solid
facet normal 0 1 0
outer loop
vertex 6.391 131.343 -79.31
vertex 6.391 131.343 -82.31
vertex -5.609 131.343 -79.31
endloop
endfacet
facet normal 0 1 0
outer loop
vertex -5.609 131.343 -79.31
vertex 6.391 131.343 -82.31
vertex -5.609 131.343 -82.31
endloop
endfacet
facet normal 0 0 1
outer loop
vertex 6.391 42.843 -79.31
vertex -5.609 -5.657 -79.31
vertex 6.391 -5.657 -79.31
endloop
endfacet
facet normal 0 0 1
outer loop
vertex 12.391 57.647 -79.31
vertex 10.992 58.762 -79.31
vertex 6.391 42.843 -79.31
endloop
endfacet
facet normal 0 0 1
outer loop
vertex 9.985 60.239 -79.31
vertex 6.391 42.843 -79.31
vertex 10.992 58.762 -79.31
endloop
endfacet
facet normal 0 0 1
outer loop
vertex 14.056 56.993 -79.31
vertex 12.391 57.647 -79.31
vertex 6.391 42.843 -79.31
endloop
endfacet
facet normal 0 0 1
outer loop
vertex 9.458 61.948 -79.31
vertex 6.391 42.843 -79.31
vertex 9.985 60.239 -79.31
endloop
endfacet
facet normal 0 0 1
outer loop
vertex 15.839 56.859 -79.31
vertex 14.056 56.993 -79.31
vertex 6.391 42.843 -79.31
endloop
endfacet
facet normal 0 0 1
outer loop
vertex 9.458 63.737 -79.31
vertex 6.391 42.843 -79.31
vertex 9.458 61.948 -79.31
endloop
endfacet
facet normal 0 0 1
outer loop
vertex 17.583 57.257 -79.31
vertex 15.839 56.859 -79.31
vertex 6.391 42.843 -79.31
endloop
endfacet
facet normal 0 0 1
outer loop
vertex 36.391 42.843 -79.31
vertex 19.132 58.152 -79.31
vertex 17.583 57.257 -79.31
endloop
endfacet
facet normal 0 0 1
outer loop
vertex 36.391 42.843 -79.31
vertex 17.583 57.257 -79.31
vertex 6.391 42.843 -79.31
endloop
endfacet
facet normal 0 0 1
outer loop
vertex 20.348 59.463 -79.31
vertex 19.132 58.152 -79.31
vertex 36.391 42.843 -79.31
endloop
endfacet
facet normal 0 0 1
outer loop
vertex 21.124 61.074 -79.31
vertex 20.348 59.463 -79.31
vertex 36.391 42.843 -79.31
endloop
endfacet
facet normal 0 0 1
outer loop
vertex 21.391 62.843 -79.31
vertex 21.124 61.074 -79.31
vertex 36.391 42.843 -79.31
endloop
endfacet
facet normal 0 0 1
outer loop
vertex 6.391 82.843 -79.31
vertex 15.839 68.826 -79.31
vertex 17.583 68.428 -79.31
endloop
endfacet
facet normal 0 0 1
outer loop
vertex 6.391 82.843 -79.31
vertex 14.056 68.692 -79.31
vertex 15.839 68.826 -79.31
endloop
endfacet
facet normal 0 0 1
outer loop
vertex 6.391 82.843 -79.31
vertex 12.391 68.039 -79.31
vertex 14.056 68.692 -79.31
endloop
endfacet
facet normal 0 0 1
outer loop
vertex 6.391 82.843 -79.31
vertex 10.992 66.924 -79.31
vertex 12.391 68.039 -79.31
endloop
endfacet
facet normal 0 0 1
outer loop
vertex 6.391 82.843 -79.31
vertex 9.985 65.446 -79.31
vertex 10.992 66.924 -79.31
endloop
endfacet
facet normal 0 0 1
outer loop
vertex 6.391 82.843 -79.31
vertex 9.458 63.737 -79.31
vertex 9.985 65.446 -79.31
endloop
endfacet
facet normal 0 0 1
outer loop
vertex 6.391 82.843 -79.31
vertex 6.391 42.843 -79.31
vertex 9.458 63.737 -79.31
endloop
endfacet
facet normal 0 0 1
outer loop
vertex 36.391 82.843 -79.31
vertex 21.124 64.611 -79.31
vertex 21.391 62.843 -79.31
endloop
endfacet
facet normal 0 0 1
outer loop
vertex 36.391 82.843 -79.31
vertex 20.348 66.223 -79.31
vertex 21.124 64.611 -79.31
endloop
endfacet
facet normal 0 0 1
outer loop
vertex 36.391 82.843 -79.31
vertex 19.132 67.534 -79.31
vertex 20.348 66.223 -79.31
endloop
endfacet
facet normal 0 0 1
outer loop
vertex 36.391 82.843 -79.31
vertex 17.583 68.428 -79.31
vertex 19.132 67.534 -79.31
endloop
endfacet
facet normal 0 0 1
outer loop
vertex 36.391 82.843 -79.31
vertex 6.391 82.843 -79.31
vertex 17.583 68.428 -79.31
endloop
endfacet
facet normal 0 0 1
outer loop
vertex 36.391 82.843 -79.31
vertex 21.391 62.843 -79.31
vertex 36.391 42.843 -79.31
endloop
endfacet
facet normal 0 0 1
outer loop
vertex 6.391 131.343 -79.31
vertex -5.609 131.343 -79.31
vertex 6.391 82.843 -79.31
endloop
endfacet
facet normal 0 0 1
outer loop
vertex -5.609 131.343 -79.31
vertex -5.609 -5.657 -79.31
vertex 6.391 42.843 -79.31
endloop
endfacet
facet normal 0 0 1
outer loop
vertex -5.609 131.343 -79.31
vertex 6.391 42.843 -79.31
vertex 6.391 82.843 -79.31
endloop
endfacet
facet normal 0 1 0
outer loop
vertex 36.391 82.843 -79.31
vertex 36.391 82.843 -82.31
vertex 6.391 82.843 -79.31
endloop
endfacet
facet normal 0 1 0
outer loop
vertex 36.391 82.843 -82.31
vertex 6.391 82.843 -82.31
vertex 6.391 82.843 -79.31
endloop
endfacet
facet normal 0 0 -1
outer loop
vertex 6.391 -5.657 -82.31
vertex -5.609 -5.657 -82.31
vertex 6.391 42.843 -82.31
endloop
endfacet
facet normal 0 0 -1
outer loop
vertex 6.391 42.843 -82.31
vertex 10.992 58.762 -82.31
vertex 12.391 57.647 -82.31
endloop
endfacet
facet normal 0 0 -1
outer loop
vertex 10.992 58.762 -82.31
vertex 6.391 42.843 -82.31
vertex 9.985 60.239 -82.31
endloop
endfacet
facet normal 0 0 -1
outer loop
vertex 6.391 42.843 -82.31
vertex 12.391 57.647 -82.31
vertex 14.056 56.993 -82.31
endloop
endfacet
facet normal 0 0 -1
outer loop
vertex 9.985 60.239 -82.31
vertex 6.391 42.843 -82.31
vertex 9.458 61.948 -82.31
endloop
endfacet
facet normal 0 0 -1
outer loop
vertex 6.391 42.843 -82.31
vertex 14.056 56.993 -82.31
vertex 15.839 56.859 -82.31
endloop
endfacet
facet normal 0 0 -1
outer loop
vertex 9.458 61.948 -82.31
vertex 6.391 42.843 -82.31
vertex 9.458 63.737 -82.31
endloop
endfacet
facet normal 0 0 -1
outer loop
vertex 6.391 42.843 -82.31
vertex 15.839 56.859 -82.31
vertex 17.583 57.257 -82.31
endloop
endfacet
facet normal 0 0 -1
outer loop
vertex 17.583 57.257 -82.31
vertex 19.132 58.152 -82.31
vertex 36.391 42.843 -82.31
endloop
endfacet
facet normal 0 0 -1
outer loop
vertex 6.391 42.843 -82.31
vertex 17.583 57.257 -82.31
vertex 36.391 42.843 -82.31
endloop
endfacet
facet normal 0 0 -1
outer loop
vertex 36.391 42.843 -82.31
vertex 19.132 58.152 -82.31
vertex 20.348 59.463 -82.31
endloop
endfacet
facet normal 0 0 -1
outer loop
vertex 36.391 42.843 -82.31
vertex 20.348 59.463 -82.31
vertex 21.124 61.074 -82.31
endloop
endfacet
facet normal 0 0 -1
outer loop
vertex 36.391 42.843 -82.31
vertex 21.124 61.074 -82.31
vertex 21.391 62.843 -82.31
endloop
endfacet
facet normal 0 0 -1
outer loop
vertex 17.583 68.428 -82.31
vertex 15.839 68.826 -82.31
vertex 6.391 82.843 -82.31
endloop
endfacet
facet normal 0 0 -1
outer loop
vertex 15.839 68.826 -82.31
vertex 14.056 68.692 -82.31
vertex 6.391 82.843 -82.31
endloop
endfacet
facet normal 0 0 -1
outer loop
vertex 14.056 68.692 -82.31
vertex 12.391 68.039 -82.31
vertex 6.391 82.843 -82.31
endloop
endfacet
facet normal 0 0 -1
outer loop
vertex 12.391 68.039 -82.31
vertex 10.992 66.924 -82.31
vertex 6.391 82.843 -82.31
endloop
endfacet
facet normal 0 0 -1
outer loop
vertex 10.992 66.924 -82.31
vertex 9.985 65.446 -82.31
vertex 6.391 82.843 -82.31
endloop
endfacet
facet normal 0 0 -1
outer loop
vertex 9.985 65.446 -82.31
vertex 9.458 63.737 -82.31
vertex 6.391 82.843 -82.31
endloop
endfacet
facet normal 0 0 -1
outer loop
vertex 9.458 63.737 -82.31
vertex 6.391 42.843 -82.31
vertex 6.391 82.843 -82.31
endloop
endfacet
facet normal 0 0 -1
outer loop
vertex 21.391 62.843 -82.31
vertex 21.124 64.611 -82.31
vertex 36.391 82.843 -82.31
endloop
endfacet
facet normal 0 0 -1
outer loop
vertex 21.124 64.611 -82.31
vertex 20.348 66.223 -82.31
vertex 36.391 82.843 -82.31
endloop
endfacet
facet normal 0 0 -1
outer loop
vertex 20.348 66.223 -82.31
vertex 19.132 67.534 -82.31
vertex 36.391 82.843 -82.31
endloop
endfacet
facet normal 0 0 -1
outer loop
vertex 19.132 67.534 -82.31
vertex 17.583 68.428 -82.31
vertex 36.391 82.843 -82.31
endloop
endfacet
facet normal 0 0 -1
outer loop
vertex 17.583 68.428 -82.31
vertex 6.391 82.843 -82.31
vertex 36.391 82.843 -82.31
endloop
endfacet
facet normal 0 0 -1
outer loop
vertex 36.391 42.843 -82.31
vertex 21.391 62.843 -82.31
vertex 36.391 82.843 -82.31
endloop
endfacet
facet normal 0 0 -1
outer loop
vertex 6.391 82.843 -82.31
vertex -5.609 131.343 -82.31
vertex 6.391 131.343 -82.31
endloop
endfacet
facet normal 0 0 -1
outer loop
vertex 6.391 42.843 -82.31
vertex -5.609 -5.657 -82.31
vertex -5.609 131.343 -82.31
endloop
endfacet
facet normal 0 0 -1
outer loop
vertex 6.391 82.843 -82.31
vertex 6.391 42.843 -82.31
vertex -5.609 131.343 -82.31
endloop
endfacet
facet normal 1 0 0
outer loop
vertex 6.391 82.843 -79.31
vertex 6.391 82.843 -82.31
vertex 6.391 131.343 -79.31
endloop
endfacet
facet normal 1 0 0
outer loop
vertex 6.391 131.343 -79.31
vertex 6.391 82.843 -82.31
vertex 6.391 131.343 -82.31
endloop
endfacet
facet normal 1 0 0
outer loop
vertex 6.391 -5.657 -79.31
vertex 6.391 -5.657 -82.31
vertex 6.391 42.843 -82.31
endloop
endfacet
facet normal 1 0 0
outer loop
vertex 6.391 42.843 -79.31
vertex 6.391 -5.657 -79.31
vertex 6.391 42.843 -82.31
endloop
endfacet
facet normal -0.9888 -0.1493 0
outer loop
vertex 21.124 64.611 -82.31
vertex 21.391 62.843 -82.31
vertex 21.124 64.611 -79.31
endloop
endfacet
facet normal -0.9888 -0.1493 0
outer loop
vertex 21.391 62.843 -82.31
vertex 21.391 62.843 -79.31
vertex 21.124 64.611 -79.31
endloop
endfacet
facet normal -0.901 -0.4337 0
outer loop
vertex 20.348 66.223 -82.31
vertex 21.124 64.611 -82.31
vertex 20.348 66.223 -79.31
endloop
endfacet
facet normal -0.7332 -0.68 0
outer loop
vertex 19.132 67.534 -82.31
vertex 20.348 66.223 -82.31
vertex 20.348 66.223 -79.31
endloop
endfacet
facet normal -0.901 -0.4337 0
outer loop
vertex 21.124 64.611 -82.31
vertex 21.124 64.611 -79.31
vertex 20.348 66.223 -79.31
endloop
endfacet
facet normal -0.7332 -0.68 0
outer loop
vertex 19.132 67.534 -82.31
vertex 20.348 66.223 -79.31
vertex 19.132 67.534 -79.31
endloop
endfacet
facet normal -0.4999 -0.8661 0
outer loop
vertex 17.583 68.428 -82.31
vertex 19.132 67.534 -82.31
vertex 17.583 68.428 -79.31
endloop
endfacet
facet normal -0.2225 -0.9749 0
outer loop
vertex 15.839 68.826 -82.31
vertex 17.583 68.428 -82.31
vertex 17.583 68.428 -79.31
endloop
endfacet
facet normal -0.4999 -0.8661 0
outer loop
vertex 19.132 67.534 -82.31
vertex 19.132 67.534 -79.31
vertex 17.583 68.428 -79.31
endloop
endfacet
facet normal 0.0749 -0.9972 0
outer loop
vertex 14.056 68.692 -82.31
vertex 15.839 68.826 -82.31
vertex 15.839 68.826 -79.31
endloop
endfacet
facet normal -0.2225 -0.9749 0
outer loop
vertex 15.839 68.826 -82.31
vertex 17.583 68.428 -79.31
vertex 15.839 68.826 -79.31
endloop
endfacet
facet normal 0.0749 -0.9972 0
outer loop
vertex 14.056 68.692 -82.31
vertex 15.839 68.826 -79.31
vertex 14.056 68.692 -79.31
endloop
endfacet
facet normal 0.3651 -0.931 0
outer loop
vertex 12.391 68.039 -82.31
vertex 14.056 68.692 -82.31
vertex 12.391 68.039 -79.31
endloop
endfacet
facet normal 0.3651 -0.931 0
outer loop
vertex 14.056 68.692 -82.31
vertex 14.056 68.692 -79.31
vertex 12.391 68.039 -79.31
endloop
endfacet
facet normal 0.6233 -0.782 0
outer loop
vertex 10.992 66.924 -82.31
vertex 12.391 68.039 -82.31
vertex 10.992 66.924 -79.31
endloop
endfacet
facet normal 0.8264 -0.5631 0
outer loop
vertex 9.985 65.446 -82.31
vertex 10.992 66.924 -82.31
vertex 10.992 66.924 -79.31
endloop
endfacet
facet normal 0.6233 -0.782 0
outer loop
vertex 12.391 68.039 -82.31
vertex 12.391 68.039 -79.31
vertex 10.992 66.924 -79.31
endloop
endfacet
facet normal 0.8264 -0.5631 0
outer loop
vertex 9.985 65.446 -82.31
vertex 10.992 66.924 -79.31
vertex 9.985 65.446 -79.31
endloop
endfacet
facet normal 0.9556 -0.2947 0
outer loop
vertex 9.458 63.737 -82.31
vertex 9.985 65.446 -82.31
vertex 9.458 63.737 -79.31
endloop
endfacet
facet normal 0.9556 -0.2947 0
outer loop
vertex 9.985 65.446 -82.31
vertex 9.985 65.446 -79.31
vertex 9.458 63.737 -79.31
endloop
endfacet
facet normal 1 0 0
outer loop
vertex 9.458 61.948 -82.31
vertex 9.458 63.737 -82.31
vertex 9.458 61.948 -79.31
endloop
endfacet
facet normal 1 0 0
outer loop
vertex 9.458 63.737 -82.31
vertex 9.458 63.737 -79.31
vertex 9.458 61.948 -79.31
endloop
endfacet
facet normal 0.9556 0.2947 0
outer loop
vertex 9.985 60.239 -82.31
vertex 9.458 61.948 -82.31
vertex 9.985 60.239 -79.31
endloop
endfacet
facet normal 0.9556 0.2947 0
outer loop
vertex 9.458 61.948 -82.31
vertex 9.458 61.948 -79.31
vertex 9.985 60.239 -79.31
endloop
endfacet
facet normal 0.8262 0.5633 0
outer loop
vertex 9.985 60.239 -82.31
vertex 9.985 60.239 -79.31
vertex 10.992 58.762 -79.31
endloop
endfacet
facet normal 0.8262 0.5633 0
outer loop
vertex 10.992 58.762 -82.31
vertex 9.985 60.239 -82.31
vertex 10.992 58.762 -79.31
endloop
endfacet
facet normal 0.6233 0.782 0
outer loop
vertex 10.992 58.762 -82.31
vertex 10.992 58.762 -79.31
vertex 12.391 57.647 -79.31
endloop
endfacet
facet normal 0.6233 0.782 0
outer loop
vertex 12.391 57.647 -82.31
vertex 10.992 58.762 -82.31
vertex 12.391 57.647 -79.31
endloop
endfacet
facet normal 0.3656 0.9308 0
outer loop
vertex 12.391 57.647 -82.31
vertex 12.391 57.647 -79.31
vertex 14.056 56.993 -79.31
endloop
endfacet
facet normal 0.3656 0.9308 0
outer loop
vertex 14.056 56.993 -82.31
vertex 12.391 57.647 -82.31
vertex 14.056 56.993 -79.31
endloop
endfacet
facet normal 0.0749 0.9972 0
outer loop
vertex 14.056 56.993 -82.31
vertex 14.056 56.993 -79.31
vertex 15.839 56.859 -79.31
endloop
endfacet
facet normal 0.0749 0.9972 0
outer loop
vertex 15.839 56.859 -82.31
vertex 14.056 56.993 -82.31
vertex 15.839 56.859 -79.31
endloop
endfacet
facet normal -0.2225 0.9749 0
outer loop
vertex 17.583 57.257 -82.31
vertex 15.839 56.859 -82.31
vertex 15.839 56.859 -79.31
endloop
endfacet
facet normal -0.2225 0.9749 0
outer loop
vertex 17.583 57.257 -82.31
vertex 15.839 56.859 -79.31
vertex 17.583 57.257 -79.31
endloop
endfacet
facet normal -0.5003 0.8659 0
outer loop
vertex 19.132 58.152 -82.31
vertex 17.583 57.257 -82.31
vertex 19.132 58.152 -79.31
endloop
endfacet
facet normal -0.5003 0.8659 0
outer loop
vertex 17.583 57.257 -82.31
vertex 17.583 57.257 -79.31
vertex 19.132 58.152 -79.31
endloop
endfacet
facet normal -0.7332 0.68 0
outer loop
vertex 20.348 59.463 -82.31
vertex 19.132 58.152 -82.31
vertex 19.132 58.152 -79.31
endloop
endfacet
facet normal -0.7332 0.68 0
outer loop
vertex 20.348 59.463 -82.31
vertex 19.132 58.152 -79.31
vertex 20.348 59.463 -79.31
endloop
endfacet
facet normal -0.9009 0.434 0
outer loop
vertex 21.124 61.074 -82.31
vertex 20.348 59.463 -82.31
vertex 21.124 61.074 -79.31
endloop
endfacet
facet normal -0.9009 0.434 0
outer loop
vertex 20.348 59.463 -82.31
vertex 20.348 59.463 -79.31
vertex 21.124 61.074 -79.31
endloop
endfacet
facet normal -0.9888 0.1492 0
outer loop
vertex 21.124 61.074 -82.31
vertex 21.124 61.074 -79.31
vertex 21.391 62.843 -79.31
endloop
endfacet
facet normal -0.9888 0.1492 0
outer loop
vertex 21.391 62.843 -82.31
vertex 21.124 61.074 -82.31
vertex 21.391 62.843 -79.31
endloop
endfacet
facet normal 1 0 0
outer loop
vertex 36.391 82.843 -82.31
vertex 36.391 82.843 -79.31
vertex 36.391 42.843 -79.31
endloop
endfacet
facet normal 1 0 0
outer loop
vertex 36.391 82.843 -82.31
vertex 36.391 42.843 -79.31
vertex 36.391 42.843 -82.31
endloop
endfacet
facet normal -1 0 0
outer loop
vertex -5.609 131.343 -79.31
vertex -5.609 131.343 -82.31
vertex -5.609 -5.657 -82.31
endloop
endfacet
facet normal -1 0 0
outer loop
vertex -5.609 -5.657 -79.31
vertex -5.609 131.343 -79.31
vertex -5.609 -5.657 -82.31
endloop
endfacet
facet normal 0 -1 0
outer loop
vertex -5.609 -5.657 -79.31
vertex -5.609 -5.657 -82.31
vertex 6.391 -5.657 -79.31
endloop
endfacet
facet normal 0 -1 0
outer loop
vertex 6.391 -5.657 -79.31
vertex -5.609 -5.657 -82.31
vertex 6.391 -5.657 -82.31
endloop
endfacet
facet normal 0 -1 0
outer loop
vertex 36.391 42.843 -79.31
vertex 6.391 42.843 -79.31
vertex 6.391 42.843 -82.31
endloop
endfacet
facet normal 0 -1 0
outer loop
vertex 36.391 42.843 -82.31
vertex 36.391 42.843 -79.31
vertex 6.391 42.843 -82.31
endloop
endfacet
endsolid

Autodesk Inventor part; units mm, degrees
ref_plane "YZ Plane" through (0, 0, 0) normal (1, 0, 0) x (0, 1, 0)
ref_plane "XZ Plane" through (0, 0, 0) normal (0, 1, 0) x (-1, 0, 0)
ref_plane "XY Plane" through (0, 0, 0) normal (0, 0, 1) x (1, 0, 0)
sketch "Sketch1" plane through (0, 0, 0) normal (0, 0, 1) x (1, 0, 0)
  point P0 (0, 0)
ref_plane "Work Plane1" through (0, 125.1054, -82.3097) normal (0, 0, 1) x (1, 0, 0)
sketch "Sketch2" plane through (0, 125.1054, -82.3097) normal (0, 0, 1) x (1, 0, 0)
  circle A0 centre (0.3907, 0.2373) radius 6 projected
  circle A1 centre (0.3907, -124.7627) radius 6 projected
  line L0 (6.3907, 6.2373) -> (-5.6093, 6.2373)
  line L1 (-5.6093, 6.2373) -> (-5.6093, -130.7627)
  line L2 (-5.6093, -130.7627) -> (6.3907, -130.7627)
  line L3 (6.3907, -130.7627) -> (6.3907, 6.2373)
  point P0 (0, -125.1054)
extrude "Extrusion1" add sketch "Sketch2" along normal blind 3
sketch "Sketch5" plane through (6.3907, -5.6573, -82.3097) normal (1, 0, 0) x (0, 0, -1)
  line L0 (0, 0) -> (0, 137) projected
  line L1 (0, 137) -> (-3, 137) projected
  line L2 (-3, 0) -> (-3, 137) projected
  line L3 (0, 0) -> (-3, 0) projected
  line L4 (-3, 0) -> (-3, 137) construction
  line L5 (-3, 68.5) -> (0, 68.5) construction
  line L6 (0, 0) -> (0, 137) construction
  line L7 (-3, 48.5) -> (0, 48.5)
  line L8 (0, 48.5) -> (0, 88.5)
  line L9 (0, 88.5) -> (-3, 88.5)
  line L10 (-3, 88.5) -> (-3, 48.5)
  line L11 (-3, 48.5) -> (0, 88.5) construction
  line L12 (0, 48.5) -> (-3, 88.5) construction
  point P0 (-82.3097, 5.6573)
  point P1 (-1.5, 68.5)
  point P2 (0, 88.5)
  point P3 (-3, 88.5)
  point P4 (-3, 48.5)
  point P5 (0, 48.5)
  dimension "d9" = 3
  dimension "d10" = 40
extrude "Extrusion4" add sketch "Sketch5" along normal blind 30 contours L7 L2 L9 L0
sketch "Sketch6" plane through (0, 125.1054, -82.3097) normal (0, 0, -1) x (-1, 0, 0)
  point P0 (0, -125.1054)
sketch "Sketch7" plane through (0, 125.1054, -79.3097) normal (0, 0, 1) x (1, 0, 0)
  line L0 (6.3907, 6.2373) -> (-5.6093, 6.2373) construction
  line L1 (-5.6093, 6.2373) -> (-5.6093, -130.7627) construction
  line L2 (-5.6093, -130.7627) -> (6.3907, -130.7627) construction
  line L3 (6.3907, -130.7627) -> (6.3907, -82.2627) construction
  line L4 (6.3907, -82.2627) -> (36.3907, -82.2627) construction
  line L5 (36.3907, -42.2627) -> (36.3907, -82.2627) construction
  line L6 (6.3907, -42.2627) -> (36.3907, -42.2627) construction
  line L7 (6.3907, -42.2627) -> (6.3907, 6.2373) construction
  line L8 (6.3907, -130.7627) -> (6.3907, -82.2627) construction
  line L9 (6.3907, -42.2627) -> (6.3907, -82.2627) construction
  circle A0 centre (15.3907, -62.2627) radius 6
  point P0 (0, -125.1054)
  point P1 (6.3907, -62.2627)
  dimension "d13" = 12
  dimension "d14" = 9
extrude "Extrusion5" cut sketch "Sketch7" against normal blind 30
properties part number "Linear rod connecting plate"
